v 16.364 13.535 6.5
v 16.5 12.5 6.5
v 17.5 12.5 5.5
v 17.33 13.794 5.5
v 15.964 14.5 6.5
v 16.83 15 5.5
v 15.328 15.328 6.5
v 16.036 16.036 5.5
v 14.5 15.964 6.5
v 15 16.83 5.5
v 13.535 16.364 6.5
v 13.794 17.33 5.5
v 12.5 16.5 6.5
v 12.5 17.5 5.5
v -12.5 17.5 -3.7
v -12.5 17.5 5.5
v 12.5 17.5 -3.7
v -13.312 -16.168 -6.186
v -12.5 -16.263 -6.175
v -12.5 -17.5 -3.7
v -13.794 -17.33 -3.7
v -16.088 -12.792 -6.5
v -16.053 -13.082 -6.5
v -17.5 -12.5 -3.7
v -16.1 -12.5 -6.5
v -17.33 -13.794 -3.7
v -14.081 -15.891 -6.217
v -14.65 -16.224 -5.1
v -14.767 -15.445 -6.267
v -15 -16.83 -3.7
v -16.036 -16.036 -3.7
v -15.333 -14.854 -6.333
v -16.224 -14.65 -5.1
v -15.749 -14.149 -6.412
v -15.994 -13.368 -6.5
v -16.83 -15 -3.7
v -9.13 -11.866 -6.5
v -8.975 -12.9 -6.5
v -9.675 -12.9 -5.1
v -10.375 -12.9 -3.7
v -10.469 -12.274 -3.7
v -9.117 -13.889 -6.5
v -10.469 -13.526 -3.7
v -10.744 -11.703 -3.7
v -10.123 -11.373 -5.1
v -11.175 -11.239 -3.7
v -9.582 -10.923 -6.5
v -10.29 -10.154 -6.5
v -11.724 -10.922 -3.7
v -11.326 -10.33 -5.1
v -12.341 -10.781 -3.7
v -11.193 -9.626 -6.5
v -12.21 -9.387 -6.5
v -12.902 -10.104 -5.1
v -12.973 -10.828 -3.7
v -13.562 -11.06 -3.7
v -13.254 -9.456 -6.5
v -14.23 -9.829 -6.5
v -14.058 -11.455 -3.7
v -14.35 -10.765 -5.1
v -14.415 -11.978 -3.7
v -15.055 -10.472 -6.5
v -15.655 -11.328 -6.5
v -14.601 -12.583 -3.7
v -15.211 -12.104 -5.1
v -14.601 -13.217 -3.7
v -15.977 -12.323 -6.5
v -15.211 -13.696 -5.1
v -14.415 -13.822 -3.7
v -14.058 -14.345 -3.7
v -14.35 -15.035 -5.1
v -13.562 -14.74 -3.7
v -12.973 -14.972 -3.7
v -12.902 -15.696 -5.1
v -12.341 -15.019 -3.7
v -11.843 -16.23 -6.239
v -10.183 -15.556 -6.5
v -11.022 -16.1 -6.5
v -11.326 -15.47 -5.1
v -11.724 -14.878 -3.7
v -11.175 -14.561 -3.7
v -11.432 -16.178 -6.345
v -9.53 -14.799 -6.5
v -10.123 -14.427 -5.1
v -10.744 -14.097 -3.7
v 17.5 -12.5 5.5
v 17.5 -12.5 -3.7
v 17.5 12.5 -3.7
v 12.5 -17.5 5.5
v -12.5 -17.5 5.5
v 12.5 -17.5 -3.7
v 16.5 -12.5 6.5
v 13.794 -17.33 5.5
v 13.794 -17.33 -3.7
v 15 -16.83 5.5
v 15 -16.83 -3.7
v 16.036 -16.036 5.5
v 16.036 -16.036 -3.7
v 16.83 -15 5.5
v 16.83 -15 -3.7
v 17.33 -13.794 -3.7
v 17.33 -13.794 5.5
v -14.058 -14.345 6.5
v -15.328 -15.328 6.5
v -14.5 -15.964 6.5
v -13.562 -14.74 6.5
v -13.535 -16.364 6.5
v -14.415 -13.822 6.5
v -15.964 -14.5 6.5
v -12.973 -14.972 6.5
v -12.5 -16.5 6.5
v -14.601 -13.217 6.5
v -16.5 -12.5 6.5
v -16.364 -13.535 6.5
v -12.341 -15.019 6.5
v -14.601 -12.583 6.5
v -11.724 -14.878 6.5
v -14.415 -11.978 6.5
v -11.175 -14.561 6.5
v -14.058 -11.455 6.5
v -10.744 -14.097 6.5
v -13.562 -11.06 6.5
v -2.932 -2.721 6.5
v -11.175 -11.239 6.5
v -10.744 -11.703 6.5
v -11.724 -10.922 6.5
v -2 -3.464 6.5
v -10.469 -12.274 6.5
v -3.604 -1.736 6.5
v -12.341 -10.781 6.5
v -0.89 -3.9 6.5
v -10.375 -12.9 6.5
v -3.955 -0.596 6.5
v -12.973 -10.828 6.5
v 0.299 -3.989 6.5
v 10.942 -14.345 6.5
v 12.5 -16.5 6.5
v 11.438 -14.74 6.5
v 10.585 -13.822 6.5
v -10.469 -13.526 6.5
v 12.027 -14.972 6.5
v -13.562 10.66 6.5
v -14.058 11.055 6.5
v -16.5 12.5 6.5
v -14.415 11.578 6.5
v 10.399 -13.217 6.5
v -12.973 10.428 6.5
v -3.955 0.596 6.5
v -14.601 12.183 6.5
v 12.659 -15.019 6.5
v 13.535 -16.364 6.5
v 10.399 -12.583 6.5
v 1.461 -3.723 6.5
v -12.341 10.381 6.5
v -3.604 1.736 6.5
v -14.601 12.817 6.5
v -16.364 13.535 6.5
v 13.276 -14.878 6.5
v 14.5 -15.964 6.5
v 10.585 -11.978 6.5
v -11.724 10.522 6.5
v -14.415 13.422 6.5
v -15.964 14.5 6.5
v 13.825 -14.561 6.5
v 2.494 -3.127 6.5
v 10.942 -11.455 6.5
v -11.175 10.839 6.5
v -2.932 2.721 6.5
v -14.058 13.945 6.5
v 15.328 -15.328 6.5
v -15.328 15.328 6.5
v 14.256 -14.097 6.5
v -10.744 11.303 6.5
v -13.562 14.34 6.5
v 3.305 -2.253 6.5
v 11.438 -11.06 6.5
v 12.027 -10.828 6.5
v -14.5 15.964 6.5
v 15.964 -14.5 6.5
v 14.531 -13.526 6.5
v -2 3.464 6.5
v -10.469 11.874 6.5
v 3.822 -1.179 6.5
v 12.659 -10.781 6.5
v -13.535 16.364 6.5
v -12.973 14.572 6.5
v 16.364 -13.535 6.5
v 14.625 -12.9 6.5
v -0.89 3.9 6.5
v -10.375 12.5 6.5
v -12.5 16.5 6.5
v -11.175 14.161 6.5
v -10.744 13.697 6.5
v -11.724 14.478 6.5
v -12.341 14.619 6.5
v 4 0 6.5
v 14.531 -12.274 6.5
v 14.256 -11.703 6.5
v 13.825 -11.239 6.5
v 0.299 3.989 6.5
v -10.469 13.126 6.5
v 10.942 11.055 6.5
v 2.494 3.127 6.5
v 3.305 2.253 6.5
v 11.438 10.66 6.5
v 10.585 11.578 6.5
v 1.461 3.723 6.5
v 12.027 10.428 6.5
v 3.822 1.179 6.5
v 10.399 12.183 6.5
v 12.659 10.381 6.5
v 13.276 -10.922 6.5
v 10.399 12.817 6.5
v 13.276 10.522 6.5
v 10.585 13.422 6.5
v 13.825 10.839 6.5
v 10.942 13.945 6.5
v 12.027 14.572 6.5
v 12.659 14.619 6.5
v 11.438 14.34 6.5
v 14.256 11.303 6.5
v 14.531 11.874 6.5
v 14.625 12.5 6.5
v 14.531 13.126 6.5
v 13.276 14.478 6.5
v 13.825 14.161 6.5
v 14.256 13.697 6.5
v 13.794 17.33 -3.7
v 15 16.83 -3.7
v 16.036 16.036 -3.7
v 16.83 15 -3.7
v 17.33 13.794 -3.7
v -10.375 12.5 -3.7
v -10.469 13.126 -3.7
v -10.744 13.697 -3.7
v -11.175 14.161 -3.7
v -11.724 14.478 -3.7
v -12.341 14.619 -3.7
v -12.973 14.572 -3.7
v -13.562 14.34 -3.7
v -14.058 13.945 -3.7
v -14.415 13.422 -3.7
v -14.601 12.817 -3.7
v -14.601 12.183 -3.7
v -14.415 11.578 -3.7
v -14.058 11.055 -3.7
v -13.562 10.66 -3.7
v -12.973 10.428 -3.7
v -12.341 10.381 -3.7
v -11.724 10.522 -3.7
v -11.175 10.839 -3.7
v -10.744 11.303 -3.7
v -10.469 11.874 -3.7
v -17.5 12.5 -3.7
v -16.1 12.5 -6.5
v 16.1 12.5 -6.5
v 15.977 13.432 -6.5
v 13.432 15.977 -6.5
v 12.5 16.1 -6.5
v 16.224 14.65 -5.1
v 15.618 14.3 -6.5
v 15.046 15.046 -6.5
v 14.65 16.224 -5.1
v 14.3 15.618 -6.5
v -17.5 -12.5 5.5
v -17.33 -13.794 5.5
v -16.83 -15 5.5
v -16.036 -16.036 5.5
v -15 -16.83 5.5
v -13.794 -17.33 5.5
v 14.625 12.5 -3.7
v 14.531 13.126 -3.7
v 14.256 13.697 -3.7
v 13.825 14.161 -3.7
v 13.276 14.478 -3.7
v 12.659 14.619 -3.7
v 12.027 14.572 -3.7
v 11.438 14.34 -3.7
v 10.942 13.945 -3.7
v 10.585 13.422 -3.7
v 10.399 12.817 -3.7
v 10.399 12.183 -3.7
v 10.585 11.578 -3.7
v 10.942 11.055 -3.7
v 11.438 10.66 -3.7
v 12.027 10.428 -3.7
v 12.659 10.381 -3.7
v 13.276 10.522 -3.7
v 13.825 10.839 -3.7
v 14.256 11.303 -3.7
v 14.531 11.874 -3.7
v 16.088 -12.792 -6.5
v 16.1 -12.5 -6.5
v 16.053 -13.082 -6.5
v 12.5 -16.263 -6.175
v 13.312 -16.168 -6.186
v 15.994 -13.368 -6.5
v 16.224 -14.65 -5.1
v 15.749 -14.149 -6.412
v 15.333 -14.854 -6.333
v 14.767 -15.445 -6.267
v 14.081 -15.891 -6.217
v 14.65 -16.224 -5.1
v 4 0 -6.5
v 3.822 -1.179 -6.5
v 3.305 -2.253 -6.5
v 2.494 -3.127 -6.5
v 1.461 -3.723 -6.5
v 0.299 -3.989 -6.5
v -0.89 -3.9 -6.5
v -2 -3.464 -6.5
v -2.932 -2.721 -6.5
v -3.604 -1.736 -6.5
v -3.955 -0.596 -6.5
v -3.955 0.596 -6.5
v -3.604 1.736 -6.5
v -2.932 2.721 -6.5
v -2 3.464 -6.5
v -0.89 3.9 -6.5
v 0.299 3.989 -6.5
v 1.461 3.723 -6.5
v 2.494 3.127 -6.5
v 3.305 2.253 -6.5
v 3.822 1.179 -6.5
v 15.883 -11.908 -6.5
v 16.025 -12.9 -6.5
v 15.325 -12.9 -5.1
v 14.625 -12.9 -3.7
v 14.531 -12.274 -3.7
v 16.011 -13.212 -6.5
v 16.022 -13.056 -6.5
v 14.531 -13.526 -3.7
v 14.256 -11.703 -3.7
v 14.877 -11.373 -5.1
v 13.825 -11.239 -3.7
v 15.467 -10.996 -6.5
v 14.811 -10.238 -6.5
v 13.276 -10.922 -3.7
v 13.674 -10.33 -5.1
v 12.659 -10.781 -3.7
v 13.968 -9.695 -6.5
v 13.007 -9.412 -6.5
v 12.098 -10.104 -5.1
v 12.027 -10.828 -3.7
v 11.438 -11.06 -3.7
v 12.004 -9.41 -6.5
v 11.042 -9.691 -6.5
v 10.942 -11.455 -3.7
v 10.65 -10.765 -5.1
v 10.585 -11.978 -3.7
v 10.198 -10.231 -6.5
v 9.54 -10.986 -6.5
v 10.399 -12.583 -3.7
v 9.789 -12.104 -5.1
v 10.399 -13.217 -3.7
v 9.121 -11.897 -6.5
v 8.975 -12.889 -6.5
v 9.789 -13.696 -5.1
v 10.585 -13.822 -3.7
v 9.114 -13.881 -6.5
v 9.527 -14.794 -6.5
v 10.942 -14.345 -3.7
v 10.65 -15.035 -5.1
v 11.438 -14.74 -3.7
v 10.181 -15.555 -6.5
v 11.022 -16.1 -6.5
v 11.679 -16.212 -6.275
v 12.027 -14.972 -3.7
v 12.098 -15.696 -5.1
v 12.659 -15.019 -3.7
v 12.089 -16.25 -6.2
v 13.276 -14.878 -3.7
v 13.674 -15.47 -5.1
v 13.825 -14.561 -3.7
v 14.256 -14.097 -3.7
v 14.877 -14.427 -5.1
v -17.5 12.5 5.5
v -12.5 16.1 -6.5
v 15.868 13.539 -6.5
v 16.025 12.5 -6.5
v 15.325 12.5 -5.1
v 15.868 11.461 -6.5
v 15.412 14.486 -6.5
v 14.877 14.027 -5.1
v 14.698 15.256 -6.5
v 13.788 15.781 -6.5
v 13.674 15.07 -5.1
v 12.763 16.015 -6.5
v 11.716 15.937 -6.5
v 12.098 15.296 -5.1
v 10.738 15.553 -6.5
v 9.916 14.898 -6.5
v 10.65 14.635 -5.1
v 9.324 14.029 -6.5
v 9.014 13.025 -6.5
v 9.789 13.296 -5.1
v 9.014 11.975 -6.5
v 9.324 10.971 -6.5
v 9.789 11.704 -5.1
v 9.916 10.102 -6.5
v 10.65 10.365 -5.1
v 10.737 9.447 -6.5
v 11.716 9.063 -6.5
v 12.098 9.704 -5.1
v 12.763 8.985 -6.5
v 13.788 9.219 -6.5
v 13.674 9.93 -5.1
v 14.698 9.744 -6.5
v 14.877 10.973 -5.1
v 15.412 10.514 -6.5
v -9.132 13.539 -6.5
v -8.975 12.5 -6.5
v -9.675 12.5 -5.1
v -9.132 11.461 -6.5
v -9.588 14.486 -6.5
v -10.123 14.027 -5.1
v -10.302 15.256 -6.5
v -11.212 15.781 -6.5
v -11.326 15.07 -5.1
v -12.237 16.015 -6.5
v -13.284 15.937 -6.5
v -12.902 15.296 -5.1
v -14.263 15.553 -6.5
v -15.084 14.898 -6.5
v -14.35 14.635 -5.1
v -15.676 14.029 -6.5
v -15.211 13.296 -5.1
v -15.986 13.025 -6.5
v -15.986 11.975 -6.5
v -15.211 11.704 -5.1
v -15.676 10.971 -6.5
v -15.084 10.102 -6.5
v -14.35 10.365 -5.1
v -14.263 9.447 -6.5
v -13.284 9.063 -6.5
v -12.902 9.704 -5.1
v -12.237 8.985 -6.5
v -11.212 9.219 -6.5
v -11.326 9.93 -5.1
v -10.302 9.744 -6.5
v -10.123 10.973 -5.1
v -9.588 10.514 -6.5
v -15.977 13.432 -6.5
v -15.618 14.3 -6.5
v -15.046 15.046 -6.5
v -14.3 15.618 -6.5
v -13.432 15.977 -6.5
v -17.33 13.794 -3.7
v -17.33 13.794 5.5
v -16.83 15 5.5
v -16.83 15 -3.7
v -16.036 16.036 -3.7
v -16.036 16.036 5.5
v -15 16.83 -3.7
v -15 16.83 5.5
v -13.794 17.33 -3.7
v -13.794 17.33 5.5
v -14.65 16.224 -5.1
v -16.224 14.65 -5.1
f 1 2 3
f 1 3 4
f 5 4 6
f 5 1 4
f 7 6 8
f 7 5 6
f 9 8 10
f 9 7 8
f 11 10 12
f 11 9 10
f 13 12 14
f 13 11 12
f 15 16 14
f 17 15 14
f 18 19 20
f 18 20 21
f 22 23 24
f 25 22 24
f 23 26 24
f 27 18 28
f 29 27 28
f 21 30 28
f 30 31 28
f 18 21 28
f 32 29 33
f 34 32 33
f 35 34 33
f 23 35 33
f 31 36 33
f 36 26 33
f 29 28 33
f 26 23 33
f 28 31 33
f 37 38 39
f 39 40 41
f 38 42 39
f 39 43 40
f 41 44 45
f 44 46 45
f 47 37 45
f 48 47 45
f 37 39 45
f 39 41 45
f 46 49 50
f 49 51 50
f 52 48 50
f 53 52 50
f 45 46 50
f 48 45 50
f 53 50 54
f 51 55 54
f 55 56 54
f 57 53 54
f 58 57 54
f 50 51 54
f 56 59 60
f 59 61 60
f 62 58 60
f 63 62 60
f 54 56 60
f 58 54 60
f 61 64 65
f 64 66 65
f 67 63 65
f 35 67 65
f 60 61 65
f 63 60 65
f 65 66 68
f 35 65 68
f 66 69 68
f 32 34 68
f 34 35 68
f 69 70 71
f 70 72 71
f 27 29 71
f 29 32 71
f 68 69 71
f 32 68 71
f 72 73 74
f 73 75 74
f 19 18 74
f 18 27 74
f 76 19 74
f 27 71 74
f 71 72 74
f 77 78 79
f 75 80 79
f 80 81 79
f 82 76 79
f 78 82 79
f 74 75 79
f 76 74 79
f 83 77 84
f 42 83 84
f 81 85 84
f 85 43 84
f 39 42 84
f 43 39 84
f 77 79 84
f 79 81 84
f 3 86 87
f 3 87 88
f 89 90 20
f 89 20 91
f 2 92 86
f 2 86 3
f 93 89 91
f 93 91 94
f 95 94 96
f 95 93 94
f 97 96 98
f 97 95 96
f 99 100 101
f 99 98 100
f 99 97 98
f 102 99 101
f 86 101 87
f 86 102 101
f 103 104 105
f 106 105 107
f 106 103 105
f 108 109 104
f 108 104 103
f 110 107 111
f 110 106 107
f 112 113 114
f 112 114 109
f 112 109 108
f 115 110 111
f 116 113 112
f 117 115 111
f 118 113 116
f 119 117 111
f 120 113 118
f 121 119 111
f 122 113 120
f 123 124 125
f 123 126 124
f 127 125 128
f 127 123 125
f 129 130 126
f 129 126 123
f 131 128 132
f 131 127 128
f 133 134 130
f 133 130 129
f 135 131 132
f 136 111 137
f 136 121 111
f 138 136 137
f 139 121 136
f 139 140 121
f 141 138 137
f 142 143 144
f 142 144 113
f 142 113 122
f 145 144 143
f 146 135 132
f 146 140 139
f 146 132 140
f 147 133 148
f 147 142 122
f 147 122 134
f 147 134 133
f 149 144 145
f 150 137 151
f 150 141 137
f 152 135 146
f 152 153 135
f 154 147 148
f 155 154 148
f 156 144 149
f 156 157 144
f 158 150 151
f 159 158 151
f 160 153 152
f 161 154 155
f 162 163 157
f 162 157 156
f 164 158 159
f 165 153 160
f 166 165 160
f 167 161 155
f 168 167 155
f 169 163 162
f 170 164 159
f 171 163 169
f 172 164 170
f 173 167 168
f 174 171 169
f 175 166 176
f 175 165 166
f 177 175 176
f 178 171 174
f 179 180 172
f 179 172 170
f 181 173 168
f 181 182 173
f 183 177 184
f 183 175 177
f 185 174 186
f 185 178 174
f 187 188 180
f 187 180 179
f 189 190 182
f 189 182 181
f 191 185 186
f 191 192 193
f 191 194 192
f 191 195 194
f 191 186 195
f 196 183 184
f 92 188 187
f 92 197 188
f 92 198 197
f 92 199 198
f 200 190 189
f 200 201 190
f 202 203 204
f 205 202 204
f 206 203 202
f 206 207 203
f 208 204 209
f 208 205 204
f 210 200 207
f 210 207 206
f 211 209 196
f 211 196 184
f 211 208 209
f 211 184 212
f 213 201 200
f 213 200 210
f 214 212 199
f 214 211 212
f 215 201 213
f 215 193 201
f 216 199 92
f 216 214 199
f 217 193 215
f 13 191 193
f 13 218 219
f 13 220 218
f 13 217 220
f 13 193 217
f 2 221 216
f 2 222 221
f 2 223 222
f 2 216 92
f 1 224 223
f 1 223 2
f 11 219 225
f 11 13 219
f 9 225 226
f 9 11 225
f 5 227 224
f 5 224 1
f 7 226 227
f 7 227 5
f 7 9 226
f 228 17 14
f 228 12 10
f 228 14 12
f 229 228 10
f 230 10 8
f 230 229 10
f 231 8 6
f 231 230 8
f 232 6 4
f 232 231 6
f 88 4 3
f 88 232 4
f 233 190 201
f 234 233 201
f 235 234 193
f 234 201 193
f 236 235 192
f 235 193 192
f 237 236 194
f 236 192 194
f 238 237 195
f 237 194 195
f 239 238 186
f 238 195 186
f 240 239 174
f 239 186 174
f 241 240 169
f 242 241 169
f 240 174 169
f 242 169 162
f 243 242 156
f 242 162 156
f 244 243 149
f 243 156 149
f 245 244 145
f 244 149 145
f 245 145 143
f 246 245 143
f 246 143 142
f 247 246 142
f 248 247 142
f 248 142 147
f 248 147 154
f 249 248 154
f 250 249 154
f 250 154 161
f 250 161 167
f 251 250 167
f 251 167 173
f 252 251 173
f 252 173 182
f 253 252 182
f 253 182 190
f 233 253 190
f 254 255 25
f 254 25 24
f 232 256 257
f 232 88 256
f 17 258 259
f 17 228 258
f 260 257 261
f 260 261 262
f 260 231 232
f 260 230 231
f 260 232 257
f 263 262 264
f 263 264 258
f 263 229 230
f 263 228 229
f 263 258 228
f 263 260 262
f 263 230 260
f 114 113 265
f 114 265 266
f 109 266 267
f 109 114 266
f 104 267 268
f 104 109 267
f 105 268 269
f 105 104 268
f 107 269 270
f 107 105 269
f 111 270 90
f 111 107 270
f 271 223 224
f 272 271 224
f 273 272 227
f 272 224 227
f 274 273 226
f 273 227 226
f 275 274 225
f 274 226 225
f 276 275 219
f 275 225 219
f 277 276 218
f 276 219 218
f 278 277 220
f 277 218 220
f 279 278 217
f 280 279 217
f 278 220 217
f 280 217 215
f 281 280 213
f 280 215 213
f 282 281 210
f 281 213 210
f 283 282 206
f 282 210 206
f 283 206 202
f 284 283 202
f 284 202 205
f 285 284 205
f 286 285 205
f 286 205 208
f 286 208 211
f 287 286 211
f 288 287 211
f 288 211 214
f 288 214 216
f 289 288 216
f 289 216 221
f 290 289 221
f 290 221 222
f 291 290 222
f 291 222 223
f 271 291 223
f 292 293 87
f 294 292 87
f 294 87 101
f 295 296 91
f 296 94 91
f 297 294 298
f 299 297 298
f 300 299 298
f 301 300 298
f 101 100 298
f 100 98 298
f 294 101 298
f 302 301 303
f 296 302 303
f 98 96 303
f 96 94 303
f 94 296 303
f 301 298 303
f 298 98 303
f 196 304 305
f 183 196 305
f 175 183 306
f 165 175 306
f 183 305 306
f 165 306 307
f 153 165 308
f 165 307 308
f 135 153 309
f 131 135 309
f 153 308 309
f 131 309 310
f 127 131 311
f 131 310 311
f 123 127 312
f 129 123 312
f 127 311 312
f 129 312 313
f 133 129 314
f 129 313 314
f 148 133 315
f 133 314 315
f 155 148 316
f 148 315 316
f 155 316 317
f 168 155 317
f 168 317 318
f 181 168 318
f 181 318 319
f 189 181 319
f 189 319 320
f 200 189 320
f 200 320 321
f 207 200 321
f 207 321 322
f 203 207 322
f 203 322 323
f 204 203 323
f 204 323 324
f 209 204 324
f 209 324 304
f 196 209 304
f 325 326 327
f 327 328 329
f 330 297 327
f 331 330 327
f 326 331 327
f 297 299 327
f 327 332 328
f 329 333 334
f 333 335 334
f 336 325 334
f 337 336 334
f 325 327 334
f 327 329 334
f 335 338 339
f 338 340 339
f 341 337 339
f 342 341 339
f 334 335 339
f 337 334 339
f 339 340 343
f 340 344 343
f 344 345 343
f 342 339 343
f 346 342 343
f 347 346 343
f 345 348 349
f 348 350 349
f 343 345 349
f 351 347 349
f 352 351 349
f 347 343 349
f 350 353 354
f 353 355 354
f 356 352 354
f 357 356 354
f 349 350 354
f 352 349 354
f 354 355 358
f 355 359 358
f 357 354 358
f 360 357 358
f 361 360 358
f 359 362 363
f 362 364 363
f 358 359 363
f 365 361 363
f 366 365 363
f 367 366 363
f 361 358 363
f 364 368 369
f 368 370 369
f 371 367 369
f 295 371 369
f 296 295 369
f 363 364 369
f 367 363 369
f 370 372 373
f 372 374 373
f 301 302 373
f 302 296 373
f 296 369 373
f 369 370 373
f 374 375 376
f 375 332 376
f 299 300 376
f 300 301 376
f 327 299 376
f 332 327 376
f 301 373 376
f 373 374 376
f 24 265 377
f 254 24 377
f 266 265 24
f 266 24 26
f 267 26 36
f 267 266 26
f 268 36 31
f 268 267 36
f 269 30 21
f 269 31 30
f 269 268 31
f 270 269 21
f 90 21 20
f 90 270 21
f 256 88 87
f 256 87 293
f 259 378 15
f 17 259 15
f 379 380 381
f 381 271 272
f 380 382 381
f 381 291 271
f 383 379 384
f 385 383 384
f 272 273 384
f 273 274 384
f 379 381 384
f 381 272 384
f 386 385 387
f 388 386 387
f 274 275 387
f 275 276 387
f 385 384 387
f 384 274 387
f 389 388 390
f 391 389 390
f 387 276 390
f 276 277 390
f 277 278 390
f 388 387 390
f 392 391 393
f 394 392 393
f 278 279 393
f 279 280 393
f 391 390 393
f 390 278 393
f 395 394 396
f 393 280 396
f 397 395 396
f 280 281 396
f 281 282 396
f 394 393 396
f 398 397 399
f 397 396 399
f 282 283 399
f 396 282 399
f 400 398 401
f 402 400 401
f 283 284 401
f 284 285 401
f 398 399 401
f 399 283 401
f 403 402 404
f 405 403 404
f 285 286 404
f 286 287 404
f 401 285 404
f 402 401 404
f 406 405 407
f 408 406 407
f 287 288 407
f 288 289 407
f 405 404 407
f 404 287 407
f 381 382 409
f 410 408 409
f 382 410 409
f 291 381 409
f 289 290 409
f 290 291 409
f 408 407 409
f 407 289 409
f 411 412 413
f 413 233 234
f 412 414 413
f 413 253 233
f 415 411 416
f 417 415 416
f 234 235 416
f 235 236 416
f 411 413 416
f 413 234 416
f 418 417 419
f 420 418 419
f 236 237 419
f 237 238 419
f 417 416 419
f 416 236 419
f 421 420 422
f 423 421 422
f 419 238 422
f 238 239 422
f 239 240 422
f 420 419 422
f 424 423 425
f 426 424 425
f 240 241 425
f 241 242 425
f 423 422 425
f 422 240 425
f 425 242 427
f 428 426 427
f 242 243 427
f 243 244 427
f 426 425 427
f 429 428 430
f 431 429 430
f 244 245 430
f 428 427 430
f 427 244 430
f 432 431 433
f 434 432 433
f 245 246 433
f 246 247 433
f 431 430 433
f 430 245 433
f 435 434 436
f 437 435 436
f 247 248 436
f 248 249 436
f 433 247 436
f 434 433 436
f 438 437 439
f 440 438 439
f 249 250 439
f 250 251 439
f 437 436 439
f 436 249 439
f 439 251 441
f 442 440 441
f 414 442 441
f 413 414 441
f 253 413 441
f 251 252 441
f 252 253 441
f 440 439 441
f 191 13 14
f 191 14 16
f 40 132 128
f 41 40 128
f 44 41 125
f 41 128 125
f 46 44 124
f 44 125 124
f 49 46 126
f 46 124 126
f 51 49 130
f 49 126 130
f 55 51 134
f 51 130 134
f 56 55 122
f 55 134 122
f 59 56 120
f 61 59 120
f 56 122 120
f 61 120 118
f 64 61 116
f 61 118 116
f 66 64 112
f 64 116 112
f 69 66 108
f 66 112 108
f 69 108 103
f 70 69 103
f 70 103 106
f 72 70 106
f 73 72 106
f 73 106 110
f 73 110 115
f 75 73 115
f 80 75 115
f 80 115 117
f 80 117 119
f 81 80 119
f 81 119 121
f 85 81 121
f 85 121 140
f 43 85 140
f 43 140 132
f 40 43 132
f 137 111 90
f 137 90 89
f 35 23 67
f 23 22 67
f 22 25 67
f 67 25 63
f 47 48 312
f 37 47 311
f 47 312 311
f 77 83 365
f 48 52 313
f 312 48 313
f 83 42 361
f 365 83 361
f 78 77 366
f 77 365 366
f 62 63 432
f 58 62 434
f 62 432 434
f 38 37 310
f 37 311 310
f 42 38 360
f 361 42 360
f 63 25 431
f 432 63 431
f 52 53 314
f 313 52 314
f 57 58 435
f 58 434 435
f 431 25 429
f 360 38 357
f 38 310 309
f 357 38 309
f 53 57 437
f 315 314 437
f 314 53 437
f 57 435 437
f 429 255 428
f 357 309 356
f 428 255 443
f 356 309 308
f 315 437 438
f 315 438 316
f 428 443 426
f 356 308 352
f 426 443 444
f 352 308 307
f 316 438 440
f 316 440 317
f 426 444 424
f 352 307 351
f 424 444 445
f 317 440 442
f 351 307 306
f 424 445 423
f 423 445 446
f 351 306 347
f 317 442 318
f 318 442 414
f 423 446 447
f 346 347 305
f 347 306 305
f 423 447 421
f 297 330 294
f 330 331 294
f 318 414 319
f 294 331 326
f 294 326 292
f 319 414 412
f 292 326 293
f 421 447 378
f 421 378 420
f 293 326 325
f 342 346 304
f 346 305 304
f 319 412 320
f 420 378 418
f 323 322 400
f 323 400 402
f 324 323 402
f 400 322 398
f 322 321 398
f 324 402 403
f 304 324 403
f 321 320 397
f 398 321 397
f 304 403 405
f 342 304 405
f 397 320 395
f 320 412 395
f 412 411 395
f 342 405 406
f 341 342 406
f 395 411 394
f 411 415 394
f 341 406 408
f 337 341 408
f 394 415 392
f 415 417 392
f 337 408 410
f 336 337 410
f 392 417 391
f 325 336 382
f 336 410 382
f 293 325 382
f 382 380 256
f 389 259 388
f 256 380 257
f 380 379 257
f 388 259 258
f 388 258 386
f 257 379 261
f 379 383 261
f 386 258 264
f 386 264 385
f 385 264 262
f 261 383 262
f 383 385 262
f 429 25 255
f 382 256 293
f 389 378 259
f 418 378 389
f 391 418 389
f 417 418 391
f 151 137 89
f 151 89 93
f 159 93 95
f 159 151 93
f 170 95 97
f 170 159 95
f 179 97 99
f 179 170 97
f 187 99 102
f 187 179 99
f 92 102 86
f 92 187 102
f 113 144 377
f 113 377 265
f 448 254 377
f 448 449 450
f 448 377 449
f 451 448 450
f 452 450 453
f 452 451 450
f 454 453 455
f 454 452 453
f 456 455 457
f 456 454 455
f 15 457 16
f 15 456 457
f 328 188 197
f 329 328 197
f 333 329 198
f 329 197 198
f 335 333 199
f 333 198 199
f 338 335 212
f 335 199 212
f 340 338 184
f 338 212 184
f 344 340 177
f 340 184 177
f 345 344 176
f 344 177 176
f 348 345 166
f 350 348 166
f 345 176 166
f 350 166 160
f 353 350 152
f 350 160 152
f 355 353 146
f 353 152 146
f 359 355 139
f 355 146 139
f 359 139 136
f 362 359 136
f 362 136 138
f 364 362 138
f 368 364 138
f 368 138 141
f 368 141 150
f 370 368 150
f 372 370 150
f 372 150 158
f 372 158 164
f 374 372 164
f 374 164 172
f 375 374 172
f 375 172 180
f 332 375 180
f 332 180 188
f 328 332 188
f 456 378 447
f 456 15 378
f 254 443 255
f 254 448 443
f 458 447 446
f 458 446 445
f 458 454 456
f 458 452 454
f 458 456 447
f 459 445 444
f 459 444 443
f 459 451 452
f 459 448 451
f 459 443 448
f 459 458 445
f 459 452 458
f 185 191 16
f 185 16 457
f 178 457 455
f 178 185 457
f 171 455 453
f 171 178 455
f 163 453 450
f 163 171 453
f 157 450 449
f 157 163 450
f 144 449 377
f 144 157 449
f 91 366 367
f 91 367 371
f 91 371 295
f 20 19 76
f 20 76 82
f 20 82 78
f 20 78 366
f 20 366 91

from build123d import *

# Parameters (mm, degrees)
F0_W         = 35
F0_H         = 35
F1_DEPTH     = 6.5
F2_R         = 2.125
F3_DEPTH     = 13.001
F4_R         = 5
F5_T1_DEPTH  = 25
F5_T3_DEPTH  = 25
F5_T12_ANGLE = 90
F5_T14_ANGLE = 90
F5_T16_ANGLE = 90
F5_T18_ANGLE = 90
F6_R         = 4
F7_DEPTH     = 13.001
F8_SIZE      = 1


# Not quite as in the source:
# - a fillet or chamfer that OpenCascade refuses, or shapes differently, is made with other operations: its cross-section is extruded or revolved along the edge and cut away or added


with BuildPart() as f1:
    # F0 (on Top) → F1 (new body, symmetric)
    with BuildSketch(Plane.XY):
        Rectangle(F0_W, F0_H)
    extrude(amount=F1_DEPTH, both=True)

    # F2 (on face) → F3 (cut, through all)
    with BuildSketch(Plane.XY.offset(6.5)):
        with Locations((-12.5, -12.9)):
            Circle(F2_R)
        with Locations((-12.5, 12.5)):
            Circle(F2_R)
        with Locations((12.5, 12.5)):
            Circle(F2_R)
        with Locations((12.5, -12.9)):
            Circle(F2_R)
    extrude(amount=-F3_DEPTH, mode=Mode.SUBTRACT)

    # F4
    f4_edges = [f1.edges().sort_by_distance(p)[0] for p in [
        (-17.5, 17.5, 0),
        (17.5, 17.5, 0),
        (17.5, -17.5, 0),
        (-17.5, -17.5, 0),
    ]]
    fillet(f4_edges, radius=F4_R)

    # F5: chamfer of 1.4 x 2.8 on 12 edges, made by hand

    # F5_s2 → F5_t1 (cut)
    with BuildSketch(Plane.XZ.offset(-12.5)):
        Polygon((17.5, -3.7), (16.1, -6.5), (17.5, -6.5), align=None)
        Polygon((-16.1, -6.5), (-17.5, -3.7), (-17.5, -6.5), align=None)
    extrude(amount=F5_T1_DEPTH, mode=Mode.SUBTRACT)

    # F5_s4 → F5_t3 (cut)
    with BuildSketch(Plane.YZ.offset(-12.5)):
        Polygon((-16.1, -6.5), (-17.5, -3.7), (-17.5, -6.5), align=None)
        Polygon((16.1, -6.5), (17.5, -3.7), (17.5, -6.5), align=None)
    extrude(amount=F5_T3_DEPTH, mode=Mode.SUBTRACT)

    # F5_s5 → F5_t6 (revolve, cut)
    with BuildSketch(Plane.XZ.offset(12.9)):
        Polygon((-8.975, -6.5), (-10.375, -3.7), (-10.375, -6.5), align=None)
    revolve(axis=Axis((-12.5, -12.9, -6.5), (0, 0, 1)), mode=Mode.SUBTRACT)

    # F5_s7 → F5_t8 (revolve, cut)
    with BuildSketch(Plane.XZ.offset(12.9)):
        Polygon((16.025, -6.5), (14.625, -3.7), (14.625, -6.5), align=None)
    revolve(axis=Axis((12.5, -12.9, -6.5), (0, 0, 1)), mode=Mode.SUBTRACT)

    # F5_s9 → F5_t10 (revolve, cut)
    with BuildSketch(Plane.XZ.offset(-12.5)):
        Polygon((16.025, -6.5), (14.625, -3.7), (14.625, -6.5), align=None)
    revolve(axis=Axis((12.5, 12.5, -6.5), (0, 0, 1)), mode=Mode.SUBTRACT)

    # F5_s11 → F5_t12 (revolve, cut)
    with BuildSketch(Plane.XZ.offset(12.5)):
        Polygon((16.1, -6.5), (17.5, -3.7), (17.5, -6.5), align=None)
    revolve(axis=Axis((12.5, -12.5, -6.5), (0, 0, -1)), revolution_arc=F5_T12_ANGLE, mode=Mode.SUBTRACT)

    # F5_s13 → F5_t14 (revolve, cut)
    with BuildSketch(Plane.XZ.offset(-12.5)):
        Polygon((16.1, -6.5), (17.5, -3.7), (17.5, -6.5), align=None)
    revolve(axis=Axis((12.5, 12.5, -6.5), (0, 0, 1)), revolution_arc=F5_T14_ANGLE, mode=Mode.SUBTRACT)

    # F5_s15 → F5_t16 (revolve, cut)
    with BuildSketch(Plane.YZ.offset(-12.5)):
        Polygon((-16.1, -6.5), (-17.5, -3.7), (-17.5, -6.5), align=None)
    revolve(axis=Axis((-12.5, -12.5, -6.5), (0, 0, -1)), revolution_arc=F5_T16_ANGLE, mode=Mode.SUBTRACT)

    # F5_s17 → F5_t18 (revolve, cut)
    with BuildSketch(Plane.YZ.offset(-12.5)):
        Polygon((16.1, -6.5), (17.5, -3.7), (17.5, -6.5), align=None)
    revolve(axis=Axis((-12.5, 12.5, -6.5), (0, 0, 1)), revolution_arc=F5_T18_ANGLE, mode=Mode.SUBTRACT)

    # F5_s19 → F5_t20 (revolve, cut)
    with BuildSketch(Plane.XZ.offset(-12.5)):
        Polygon((-8.975, -6.5), (-10.375, -3.7), (-10.375, -6.5), align=None)
    revolve(axis=Axis((-12.5, 12.5, -6.5), (0, 0, 1)), mode=Mode.SUBTRACT)

    # F6 (on face) → F7 (cut, through all)
    with BuildSketch(Plane(origin=(0, 0, -6.5), x_dir=(1, 0, 0), z_dir=(0, 0, -1))):
        Circle(F6_R)
    extrude(amount=-F7_DEPTH, mode=Mode.SUBTRACT)

    # F8
    f8_edges = [f1.edges().sort_by_distance(p)[0] for p in [
        (-16.035534, -16.035534, 6.5),
    ]]
    chamfer(f8_edges, length=F8_SIZE)


solid = f1.part
